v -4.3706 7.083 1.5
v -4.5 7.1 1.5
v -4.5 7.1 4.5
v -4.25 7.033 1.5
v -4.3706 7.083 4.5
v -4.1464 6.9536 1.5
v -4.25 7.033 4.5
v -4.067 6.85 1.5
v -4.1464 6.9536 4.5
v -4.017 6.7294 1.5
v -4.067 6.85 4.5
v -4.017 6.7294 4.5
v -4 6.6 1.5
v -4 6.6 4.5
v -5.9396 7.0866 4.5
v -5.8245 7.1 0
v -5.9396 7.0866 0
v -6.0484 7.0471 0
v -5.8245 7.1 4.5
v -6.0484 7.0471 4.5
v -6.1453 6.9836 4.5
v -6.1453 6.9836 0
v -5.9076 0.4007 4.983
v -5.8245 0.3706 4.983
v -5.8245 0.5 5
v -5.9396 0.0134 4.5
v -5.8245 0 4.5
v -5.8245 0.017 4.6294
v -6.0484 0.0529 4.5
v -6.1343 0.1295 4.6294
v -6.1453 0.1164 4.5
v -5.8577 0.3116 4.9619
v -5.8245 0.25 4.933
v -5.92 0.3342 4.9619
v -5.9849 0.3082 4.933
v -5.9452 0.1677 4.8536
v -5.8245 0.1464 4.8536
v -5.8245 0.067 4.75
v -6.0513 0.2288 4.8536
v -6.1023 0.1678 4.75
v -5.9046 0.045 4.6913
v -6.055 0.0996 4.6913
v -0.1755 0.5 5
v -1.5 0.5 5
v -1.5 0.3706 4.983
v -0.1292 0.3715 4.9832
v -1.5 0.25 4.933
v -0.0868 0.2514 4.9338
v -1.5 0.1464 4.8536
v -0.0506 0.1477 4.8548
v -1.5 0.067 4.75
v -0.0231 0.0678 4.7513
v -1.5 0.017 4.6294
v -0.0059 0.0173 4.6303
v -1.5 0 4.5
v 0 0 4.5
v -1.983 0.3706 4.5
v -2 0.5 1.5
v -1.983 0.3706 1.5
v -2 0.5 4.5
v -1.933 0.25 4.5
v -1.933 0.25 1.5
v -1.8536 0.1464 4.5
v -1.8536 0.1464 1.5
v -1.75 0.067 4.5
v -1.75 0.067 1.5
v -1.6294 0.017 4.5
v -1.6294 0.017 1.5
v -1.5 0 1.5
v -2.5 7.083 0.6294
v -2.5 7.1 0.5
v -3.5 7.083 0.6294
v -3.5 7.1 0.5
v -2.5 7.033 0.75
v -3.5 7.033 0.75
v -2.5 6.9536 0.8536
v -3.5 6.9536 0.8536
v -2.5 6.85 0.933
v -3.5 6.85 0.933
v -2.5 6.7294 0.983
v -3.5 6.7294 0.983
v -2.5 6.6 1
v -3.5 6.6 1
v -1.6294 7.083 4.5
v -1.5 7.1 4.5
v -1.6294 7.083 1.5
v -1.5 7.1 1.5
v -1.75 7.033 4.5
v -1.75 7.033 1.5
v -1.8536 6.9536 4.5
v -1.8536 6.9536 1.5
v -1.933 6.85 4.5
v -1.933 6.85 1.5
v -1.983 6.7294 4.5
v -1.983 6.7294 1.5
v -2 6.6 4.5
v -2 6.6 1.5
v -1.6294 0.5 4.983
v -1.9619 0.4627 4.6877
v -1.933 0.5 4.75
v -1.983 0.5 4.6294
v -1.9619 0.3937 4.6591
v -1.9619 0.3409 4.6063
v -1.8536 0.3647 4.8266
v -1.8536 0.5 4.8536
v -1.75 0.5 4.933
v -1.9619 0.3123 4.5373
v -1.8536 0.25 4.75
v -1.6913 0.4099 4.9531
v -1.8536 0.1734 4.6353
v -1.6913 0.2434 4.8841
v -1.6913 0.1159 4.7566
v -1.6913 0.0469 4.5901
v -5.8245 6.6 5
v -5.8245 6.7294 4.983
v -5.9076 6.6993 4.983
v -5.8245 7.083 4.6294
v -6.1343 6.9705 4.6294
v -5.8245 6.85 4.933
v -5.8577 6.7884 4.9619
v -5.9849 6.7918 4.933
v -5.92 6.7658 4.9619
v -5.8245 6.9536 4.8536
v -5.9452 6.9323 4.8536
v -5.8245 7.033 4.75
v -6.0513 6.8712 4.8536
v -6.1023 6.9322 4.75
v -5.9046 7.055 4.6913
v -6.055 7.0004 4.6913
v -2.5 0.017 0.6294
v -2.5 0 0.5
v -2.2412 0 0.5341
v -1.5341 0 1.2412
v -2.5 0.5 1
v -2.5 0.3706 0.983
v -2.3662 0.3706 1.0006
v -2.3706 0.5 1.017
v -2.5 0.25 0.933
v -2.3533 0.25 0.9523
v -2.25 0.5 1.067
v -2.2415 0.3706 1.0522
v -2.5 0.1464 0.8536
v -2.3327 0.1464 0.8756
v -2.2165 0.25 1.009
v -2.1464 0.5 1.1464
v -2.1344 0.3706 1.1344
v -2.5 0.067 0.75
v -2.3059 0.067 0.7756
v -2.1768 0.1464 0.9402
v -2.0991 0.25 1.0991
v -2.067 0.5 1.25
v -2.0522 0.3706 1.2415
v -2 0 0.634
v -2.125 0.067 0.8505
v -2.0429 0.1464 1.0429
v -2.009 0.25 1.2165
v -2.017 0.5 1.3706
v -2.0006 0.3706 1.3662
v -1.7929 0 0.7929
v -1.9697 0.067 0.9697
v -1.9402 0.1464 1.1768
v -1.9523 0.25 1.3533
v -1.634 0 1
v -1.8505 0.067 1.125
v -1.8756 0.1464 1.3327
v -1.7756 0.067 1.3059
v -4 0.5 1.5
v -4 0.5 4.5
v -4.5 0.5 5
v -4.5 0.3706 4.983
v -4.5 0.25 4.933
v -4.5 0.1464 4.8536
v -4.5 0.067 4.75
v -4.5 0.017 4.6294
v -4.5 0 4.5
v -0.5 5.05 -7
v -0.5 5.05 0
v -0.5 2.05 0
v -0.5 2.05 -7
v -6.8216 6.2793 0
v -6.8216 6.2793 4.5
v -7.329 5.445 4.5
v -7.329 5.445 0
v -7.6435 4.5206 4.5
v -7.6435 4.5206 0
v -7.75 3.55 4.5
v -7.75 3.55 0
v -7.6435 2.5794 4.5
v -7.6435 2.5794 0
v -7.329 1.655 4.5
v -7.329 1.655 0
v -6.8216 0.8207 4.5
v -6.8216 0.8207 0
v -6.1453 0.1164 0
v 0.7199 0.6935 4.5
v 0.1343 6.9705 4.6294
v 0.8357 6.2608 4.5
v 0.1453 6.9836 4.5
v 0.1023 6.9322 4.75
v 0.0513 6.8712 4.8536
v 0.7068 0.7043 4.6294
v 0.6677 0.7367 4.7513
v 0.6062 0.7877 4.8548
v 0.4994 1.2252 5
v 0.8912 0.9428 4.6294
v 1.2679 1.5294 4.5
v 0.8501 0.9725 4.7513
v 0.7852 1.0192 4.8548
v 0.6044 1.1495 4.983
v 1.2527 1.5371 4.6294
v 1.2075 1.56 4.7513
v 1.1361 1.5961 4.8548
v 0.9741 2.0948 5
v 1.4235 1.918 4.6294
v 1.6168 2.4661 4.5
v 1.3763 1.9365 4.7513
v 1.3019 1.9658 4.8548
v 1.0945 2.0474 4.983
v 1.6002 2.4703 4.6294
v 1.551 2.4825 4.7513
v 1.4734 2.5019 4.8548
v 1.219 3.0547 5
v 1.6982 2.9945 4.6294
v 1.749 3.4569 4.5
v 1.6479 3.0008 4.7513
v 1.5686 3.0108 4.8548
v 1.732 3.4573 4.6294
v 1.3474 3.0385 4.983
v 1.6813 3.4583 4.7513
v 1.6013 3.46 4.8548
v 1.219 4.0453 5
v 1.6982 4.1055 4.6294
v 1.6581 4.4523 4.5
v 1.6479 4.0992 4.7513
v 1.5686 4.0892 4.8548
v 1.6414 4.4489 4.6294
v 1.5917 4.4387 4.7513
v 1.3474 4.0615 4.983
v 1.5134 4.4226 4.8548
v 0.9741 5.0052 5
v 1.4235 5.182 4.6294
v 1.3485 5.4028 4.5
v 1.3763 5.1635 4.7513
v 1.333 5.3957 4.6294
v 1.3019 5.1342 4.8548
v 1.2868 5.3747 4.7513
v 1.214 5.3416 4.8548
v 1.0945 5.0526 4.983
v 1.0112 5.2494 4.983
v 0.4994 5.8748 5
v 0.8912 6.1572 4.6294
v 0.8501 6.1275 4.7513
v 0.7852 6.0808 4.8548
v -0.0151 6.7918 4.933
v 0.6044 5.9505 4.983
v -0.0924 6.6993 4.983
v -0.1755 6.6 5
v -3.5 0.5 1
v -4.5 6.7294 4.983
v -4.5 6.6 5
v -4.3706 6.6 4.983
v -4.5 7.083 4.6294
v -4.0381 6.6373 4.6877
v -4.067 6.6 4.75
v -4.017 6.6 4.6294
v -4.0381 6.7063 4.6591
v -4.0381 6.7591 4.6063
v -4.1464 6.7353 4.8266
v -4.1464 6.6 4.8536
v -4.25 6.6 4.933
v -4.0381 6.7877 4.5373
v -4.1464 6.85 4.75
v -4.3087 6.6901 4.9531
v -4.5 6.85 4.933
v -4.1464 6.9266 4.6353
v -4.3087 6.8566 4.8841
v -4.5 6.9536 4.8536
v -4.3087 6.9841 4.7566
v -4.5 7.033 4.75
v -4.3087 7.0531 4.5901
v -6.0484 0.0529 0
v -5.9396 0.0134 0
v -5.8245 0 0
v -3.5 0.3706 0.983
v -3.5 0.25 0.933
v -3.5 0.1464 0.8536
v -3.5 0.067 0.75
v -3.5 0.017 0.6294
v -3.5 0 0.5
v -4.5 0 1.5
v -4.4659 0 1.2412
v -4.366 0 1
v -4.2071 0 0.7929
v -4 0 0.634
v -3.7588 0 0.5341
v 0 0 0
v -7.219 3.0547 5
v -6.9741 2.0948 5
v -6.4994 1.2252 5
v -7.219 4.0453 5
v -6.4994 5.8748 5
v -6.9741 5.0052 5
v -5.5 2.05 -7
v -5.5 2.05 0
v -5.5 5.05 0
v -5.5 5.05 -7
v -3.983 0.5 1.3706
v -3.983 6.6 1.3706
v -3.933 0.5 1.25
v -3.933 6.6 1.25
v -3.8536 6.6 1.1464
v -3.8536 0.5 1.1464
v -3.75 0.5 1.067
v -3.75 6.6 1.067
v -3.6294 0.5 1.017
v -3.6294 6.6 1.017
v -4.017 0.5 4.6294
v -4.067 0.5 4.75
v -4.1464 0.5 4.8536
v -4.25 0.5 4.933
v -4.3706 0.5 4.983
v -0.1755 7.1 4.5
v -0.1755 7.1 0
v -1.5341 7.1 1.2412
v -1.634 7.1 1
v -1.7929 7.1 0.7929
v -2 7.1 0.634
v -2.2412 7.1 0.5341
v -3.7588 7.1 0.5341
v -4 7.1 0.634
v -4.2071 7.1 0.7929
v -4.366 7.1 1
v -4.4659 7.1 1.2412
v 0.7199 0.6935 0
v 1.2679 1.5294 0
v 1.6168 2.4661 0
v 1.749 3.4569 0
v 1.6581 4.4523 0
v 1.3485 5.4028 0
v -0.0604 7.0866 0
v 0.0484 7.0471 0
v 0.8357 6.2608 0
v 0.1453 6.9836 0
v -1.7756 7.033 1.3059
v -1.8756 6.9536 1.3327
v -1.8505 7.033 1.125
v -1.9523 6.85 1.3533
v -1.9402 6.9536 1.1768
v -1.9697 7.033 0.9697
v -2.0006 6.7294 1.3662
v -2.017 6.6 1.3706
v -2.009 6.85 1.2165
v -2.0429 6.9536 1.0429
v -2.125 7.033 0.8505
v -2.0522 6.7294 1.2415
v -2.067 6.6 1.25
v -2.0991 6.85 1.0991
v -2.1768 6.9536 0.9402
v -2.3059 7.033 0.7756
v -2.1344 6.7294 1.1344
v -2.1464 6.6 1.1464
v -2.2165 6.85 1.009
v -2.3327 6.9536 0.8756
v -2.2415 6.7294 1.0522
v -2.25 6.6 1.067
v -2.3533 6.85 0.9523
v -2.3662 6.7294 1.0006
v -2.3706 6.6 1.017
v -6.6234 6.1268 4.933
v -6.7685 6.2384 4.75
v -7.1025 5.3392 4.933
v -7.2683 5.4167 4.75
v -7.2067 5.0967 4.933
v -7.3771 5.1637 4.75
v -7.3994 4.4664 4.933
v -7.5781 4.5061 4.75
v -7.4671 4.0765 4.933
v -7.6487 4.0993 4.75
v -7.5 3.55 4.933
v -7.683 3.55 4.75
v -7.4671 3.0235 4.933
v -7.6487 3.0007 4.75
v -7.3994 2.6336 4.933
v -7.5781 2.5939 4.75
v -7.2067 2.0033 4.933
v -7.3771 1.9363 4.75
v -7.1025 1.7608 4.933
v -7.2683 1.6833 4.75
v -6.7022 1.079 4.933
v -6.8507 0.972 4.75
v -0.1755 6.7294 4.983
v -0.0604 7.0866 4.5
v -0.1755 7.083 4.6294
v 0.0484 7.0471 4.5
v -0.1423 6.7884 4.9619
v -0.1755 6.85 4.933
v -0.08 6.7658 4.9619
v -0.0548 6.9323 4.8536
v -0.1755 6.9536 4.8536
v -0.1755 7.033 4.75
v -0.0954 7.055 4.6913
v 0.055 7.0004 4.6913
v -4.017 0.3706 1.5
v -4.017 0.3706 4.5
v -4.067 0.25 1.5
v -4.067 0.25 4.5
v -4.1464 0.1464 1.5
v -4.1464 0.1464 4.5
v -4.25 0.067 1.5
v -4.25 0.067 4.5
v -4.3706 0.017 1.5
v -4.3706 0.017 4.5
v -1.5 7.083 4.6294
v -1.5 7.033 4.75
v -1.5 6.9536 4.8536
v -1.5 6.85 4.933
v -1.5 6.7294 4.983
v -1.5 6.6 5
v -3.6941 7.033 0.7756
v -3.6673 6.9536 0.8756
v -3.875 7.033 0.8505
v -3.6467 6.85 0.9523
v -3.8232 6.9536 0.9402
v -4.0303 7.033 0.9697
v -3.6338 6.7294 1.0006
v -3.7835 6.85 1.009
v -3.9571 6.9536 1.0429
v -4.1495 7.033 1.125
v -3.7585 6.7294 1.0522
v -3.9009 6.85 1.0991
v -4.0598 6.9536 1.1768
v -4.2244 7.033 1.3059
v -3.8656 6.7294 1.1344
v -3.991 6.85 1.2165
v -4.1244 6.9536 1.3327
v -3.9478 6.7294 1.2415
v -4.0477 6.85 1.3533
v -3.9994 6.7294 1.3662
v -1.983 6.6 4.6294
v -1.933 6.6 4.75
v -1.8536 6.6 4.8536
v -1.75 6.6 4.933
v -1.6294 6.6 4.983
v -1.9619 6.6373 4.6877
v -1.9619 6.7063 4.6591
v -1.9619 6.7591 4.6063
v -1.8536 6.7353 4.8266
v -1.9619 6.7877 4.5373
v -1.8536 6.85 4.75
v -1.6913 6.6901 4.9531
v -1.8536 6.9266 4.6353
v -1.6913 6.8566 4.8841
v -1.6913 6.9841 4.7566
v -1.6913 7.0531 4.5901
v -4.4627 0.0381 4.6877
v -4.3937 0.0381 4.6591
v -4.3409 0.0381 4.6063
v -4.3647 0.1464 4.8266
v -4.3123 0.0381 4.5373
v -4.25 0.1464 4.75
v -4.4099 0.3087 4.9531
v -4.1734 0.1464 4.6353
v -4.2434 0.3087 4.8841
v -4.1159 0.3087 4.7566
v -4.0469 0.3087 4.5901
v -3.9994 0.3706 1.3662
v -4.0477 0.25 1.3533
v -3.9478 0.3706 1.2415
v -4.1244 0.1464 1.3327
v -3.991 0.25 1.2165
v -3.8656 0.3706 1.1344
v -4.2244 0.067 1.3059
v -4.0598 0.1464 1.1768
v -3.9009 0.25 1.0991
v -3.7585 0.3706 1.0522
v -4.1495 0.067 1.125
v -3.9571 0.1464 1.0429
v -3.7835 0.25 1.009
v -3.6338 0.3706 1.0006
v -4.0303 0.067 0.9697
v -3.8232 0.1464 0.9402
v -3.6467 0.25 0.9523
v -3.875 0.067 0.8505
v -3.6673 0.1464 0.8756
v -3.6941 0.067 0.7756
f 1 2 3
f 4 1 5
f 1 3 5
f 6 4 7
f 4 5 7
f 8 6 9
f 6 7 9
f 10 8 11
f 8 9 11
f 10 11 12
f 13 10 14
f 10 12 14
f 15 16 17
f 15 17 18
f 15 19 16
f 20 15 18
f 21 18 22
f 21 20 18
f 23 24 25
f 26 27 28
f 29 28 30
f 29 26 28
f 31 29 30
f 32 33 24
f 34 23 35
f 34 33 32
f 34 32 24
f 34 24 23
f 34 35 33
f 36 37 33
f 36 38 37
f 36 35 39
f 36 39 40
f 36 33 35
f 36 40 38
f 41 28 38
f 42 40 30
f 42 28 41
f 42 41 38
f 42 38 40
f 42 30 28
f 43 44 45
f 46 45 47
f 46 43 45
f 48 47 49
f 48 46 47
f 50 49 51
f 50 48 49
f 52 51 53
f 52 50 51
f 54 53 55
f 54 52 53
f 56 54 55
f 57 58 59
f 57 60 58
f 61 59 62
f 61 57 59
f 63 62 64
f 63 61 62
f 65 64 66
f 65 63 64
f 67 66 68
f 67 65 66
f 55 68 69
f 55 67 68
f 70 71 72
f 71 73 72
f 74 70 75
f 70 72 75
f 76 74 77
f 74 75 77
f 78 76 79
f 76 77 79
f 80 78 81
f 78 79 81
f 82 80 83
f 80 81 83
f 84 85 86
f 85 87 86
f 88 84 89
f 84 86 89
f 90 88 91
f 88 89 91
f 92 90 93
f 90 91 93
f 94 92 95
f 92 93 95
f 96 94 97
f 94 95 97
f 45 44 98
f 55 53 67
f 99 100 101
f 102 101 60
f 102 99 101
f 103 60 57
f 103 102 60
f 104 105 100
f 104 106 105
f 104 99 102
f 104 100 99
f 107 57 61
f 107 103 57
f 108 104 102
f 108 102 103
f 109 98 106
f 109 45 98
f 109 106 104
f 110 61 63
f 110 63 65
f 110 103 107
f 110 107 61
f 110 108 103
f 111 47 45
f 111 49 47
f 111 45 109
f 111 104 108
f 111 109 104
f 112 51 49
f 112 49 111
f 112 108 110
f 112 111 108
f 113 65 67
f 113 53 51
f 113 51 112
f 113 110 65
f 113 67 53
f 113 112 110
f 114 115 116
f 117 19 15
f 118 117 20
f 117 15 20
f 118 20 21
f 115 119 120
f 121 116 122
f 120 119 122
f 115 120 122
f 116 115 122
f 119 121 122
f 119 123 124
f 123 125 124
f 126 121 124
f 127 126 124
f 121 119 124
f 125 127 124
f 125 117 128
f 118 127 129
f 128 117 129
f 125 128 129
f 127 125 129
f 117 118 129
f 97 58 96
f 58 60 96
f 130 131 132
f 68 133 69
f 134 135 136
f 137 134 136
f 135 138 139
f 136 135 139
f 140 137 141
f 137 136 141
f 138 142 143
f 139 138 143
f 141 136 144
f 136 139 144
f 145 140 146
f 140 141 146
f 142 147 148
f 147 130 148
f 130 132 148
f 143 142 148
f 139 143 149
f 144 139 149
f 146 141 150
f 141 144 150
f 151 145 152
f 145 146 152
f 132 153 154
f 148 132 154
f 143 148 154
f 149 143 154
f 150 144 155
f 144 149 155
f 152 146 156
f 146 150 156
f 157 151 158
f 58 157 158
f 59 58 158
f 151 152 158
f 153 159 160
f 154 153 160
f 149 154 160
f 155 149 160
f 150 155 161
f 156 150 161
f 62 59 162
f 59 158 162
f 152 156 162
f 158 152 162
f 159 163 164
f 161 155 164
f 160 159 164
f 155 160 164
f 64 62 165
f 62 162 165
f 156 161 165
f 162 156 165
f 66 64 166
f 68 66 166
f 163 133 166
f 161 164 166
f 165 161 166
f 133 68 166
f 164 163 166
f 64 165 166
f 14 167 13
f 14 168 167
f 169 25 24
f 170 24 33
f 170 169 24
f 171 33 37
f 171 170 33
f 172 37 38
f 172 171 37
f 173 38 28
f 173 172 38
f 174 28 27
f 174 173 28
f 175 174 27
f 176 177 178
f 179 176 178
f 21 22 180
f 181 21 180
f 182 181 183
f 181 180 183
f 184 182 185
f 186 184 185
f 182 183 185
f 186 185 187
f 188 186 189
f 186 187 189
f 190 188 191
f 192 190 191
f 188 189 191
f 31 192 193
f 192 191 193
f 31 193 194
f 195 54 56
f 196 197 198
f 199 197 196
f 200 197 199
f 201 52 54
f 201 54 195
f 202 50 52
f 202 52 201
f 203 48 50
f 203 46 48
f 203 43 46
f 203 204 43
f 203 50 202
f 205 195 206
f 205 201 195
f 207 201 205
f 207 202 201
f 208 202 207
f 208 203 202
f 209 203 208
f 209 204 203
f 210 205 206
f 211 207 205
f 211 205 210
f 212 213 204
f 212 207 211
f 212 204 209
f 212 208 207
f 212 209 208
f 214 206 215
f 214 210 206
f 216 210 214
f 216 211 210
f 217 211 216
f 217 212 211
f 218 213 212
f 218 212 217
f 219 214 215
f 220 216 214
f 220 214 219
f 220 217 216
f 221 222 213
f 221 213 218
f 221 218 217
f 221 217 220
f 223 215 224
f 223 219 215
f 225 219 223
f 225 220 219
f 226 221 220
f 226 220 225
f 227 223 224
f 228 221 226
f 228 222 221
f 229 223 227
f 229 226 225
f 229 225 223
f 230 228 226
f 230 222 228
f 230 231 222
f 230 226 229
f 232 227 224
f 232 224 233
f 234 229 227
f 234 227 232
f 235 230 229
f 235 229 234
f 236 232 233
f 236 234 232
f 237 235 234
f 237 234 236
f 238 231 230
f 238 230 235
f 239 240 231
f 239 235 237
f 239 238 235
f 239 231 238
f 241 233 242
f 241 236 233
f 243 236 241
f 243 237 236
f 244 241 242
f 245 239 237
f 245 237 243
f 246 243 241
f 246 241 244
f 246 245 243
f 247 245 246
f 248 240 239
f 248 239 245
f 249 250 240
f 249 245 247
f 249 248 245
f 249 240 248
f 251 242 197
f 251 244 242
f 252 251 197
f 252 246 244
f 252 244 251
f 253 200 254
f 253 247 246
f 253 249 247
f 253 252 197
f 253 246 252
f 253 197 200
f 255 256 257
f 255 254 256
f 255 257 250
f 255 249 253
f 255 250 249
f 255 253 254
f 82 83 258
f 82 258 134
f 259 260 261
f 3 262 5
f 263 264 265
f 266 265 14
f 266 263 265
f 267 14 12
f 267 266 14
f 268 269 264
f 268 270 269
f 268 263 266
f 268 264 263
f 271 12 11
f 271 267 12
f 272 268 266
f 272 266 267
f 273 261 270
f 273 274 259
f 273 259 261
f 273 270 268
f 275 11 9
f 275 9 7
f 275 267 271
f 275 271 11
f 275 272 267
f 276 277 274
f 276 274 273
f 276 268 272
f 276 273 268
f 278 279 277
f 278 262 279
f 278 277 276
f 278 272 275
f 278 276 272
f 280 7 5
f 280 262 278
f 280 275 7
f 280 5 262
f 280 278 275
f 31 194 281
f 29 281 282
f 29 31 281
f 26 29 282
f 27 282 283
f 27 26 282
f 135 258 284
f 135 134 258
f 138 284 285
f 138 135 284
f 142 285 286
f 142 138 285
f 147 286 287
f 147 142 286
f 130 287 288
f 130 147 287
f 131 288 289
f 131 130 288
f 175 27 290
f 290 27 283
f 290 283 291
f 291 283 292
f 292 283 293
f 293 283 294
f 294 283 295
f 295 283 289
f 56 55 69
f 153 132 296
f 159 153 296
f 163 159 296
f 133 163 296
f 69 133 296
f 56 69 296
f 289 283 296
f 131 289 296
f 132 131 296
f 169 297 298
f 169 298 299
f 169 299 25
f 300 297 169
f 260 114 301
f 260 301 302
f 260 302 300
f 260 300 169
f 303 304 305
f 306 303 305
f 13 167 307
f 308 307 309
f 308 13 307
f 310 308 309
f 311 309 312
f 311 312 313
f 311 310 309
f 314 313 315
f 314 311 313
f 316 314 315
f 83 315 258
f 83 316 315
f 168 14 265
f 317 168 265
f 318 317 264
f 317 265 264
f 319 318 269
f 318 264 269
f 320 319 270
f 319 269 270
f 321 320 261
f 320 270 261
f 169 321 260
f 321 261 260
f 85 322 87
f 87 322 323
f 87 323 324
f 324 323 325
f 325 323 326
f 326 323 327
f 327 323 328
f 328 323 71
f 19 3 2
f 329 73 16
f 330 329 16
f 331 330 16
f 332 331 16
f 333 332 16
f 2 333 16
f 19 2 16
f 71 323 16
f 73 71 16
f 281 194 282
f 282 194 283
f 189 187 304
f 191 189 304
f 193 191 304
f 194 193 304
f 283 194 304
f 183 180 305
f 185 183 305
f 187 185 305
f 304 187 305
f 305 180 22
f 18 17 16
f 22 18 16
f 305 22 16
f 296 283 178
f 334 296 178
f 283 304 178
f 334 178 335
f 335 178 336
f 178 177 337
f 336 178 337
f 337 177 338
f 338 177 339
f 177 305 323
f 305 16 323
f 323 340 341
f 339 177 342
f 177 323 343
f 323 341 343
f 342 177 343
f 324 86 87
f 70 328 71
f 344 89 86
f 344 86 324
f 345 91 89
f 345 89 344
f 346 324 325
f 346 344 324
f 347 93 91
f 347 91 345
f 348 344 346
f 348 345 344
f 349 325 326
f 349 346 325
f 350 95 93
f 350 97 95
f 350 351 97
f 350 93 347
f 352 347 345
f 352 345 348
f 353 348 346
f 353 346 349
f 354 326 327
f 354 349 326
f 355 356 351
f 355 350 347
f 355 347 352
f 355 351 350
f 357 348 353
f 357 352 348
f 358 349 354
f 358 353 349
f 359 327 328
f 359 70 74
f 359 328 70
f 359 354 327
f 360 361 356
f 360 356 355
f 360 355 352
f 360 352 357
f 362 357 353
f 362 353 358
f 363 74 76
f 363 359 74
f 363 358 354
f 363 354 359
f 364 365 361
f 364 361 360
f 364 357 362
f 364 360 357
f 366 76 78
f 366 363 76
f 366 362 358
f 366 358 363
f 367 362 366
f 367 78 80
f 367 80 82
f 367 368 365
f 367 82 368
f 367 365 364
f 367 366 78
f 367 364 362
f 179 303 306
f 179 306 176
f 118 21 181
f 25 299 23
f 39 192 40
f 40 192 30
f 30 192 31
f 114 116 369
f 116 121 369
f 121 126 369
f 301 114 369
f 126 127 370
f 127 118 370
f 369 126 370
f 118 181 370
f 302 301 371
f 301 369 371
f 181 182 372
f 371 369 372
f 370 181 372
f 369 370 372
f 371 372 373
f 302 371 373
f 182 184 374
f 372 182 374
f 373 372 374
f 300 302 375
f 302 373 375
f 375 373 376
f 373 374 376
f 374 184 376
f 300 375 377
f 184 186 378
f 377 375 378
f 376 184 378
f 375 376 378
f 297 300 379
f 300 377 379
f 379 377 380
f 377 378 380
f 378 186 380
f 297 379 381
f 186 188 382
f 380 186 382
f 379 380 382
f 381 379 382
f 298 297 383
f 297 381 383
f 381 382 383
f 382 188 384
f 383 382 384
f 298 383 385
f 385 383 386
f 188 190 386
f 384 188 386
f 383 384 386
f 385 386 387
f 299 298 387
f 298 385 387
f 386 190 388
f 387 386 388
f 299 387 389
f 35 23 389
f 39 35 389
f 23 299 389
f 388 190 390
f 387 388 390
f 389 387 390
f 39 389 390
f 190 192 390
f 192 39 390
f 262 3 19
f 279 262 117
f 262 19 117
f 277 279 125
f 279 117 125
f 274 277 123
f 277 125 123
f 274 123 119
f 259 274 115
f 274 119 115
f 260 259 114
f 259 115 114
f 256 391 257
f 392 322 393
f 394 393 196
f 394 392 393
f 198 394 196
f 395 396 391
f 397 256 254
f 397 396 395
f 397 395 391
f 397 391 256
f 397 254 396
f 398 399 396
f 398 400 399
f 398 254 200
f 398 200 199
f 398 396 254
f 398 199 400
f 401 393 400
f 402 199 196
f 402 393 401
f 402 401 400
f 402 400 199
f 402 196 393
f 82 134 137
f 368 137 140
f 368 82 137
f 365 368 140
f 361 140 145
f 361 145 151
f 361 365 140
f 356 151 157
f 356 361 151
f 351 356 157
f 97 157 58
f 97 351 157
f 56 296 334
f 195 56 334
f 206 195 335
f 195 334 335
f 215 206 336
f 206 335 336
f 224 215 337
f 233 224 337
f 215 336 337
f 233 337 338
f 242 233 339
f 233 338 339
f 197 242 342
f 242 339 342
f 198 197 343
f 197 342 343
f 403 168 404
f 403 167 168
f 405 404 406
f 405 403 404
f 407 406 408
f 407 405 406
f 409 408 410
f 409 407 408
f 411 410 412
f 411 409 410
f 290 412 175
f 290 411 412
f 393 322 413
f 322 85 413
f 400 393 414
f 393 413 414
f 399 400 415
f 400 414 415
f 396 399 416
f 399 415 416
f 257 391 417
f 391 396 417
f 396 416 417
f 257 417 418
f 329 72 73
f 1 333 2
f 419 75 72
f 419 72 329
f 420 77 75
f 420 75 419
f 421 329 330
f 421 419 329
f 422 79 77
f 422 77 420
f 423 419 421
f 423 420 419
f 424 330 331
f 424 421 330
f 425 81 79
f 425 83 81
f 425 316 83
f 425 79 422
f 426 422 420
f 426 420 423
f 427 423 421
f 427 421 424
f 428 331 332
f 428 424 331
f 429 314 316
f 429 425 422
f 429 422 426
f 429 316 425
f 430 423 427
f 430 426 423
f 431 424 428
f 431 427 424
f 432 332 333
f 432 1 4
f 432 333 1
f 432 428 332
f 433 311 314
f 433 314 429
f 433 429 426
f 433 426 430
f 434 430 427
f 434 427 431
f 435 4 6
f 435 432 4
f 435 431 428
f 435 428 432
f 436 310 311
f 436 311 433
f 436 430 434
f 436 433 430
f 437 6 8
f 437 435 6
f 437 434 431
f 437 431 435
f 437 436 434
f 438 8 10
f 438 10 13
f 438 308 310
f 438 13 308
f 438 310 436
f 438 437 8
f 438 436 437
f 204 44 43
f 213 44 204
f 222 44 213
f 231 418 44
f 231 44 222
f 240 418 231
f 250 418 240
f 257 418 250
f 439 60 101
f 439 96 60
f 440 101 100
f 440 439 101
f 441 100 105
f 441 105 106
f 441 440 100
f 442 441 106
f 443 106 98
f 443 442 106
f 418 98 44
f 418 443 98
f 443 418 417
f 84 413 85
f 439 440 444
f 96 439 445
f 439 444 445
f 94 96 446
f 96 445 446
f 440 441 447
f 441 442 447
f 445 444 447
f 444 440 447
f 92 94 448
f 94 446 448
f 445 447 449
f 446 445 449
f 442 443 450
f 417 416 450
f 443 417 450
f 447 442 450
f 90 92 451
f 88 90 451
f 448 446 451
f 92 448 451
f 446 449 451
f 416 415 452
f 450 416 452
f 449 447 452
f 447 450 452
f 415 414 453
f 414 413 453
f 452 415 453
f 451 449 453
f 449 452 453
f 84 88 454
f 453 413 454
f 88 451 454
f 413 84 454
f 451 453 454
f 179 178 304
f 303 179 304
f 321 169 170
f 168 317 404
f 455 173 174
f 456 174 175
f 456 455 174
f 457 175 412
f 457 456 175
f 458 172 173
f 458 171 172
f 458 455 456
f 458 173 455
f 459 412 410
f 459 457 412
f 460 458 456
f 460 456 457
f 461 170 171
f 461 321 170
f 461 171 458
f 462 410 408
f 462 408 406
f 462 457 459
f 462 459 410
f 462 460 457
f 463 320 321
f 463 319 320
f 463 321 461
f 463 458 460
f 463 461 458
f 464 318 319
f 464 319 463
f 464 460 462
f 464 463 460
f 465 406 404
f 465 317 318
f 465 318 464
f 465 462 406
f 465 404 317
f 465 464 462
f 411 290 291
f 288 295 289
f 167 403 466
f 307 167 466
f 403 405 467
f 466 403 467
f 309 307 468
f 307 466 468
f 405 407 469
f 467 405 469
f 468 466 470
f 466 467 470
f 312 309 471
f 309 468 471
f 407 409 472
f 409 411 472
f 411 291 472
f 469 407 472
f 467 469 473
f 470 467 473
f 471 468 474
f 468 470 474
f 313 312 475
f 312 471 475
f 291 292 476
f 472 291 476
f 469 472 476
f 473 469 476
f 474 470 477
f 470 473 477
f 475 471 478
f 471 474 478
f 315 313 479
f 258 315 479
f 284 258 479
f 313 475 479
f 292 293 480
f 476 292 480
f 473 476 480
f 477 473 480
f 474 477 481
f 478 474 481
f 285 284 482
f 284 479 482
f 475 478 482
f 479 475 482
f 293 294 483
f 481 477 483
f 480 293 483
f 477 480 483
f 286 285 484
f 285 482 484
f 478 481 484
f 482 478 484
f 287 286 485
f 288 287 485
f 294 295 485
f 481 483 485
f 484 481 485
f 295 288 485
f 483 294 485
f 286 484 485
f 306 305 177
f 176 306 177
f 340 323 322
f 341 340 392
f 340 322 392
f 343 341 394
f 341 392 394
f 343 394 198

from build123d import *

# Parameters (mm, degrees)
F1_DEPTH = 5
F2_W     = 1
F2_H     = 7.1
F3_DEPTH = 4
F4_F1_R  = 0.5
F4_F2_R  = 0.5
F5_W     = 2.5
F5_H     = 1.5
F6_DEPTH = 7


with BuildPart() as f1:
    # F0 (on Top) → F1 (new body)
    with BuildSketch(Plane.XY):
        with BuildLine():
            Line((-6, 0), (-6, 7.1))
            ThreePointArc((-6, 7.1), (-7.75, 3.55), (-6, 0))
        make_face()
        Polygon((-3, 7.1), (-6, 7.1), (-6, 0), (-3, 0), (-3, 3.55), align=None)
        Polygon((0, 7.1), (-3, 7.1), (-3, 3.55), (-3, 0), (0, 0), align=None)
        with BuildLine():
            ThreePointArc((0, 0), (1.75, 3.55), (0, 7.1))
            Line((0, 7.1), (0, 0))
        make_face()
    extrude(amount=F1_DEPTH)

    # F2 (on face) → F3 (cut)
    with BuildSketch(Plane.XY.offset(5)):
        with Locations((-3.5, 3.55)):
            Rectangle(F2_W, F2_H)
        with Locations((-2.5, 3.55)):
            Rectangle(F2_W, F2_H)
    extrude(amount=-F3_DEPTH, mode=Mode.SUBTRACT)

    # F4: fillet of radius 0.5 on 15 edges, made by hand

    # F4_f1
    f4_f1_edges = [f1.edges().sort_by_distance(p)[0] for p in [
        (-4, 3.55, 1),
        (-2, 3.55, 1),
    ]]
    fillet(f4_f1_edges, radius=F4_F1_R)

    # F4_f2
    f4_f2_edges = [f1.edges().sort_by_distance(p)[0] for p in [
        (-5, 7.1, 5),
        (-4, 3.55, 5),
        (-5, 0, 5),
        (-7.75, 3.55, 5),
        (-1, 7.1, 5),
        (1.75, 3.55, 5),
        (-1, 0, 5),
        (-2, 3.55, 5),
        (-3, 0, 1),
        (-3, 7.1, 1),
        (0, 7.1, 2.5),
        (-6, 7.1, 2.5),
        (-6, 0, 2.5),
        (-2.1464466094, 7.1, 1.1464466094),
        (-3.8535533906, 7.1, 1.1464466094),
        (-3.8535533906, 0, 1.1464466094),
        (-2.1464466094, 0, 1.1464466094),
    ]]
    fillet(f4_f2_edges, radius=F4_F2_R)

    # F5 (on face) → F6 (join)
    with BuildSketch(Plane(origin=(0, 0, 0), x_dir=(1, 0, 0), z_dir=(0, 0, -1))):
        with Locations((-4.25, -2.8)):
            Rectangle(F5_W, F5_H)
        with Locations((-1.75, -2.8)):
            Rectangle(F5_W, F5_H)
        with Locations((-1.75, -4.3)):
            Rectangle(F5_W, F5_H)
        with Locations((-4.25, -4.3)):
            Rectangle(F5_W, F5_H)
    extrude(amount=F6_DEPTH)


solid = f1.part
